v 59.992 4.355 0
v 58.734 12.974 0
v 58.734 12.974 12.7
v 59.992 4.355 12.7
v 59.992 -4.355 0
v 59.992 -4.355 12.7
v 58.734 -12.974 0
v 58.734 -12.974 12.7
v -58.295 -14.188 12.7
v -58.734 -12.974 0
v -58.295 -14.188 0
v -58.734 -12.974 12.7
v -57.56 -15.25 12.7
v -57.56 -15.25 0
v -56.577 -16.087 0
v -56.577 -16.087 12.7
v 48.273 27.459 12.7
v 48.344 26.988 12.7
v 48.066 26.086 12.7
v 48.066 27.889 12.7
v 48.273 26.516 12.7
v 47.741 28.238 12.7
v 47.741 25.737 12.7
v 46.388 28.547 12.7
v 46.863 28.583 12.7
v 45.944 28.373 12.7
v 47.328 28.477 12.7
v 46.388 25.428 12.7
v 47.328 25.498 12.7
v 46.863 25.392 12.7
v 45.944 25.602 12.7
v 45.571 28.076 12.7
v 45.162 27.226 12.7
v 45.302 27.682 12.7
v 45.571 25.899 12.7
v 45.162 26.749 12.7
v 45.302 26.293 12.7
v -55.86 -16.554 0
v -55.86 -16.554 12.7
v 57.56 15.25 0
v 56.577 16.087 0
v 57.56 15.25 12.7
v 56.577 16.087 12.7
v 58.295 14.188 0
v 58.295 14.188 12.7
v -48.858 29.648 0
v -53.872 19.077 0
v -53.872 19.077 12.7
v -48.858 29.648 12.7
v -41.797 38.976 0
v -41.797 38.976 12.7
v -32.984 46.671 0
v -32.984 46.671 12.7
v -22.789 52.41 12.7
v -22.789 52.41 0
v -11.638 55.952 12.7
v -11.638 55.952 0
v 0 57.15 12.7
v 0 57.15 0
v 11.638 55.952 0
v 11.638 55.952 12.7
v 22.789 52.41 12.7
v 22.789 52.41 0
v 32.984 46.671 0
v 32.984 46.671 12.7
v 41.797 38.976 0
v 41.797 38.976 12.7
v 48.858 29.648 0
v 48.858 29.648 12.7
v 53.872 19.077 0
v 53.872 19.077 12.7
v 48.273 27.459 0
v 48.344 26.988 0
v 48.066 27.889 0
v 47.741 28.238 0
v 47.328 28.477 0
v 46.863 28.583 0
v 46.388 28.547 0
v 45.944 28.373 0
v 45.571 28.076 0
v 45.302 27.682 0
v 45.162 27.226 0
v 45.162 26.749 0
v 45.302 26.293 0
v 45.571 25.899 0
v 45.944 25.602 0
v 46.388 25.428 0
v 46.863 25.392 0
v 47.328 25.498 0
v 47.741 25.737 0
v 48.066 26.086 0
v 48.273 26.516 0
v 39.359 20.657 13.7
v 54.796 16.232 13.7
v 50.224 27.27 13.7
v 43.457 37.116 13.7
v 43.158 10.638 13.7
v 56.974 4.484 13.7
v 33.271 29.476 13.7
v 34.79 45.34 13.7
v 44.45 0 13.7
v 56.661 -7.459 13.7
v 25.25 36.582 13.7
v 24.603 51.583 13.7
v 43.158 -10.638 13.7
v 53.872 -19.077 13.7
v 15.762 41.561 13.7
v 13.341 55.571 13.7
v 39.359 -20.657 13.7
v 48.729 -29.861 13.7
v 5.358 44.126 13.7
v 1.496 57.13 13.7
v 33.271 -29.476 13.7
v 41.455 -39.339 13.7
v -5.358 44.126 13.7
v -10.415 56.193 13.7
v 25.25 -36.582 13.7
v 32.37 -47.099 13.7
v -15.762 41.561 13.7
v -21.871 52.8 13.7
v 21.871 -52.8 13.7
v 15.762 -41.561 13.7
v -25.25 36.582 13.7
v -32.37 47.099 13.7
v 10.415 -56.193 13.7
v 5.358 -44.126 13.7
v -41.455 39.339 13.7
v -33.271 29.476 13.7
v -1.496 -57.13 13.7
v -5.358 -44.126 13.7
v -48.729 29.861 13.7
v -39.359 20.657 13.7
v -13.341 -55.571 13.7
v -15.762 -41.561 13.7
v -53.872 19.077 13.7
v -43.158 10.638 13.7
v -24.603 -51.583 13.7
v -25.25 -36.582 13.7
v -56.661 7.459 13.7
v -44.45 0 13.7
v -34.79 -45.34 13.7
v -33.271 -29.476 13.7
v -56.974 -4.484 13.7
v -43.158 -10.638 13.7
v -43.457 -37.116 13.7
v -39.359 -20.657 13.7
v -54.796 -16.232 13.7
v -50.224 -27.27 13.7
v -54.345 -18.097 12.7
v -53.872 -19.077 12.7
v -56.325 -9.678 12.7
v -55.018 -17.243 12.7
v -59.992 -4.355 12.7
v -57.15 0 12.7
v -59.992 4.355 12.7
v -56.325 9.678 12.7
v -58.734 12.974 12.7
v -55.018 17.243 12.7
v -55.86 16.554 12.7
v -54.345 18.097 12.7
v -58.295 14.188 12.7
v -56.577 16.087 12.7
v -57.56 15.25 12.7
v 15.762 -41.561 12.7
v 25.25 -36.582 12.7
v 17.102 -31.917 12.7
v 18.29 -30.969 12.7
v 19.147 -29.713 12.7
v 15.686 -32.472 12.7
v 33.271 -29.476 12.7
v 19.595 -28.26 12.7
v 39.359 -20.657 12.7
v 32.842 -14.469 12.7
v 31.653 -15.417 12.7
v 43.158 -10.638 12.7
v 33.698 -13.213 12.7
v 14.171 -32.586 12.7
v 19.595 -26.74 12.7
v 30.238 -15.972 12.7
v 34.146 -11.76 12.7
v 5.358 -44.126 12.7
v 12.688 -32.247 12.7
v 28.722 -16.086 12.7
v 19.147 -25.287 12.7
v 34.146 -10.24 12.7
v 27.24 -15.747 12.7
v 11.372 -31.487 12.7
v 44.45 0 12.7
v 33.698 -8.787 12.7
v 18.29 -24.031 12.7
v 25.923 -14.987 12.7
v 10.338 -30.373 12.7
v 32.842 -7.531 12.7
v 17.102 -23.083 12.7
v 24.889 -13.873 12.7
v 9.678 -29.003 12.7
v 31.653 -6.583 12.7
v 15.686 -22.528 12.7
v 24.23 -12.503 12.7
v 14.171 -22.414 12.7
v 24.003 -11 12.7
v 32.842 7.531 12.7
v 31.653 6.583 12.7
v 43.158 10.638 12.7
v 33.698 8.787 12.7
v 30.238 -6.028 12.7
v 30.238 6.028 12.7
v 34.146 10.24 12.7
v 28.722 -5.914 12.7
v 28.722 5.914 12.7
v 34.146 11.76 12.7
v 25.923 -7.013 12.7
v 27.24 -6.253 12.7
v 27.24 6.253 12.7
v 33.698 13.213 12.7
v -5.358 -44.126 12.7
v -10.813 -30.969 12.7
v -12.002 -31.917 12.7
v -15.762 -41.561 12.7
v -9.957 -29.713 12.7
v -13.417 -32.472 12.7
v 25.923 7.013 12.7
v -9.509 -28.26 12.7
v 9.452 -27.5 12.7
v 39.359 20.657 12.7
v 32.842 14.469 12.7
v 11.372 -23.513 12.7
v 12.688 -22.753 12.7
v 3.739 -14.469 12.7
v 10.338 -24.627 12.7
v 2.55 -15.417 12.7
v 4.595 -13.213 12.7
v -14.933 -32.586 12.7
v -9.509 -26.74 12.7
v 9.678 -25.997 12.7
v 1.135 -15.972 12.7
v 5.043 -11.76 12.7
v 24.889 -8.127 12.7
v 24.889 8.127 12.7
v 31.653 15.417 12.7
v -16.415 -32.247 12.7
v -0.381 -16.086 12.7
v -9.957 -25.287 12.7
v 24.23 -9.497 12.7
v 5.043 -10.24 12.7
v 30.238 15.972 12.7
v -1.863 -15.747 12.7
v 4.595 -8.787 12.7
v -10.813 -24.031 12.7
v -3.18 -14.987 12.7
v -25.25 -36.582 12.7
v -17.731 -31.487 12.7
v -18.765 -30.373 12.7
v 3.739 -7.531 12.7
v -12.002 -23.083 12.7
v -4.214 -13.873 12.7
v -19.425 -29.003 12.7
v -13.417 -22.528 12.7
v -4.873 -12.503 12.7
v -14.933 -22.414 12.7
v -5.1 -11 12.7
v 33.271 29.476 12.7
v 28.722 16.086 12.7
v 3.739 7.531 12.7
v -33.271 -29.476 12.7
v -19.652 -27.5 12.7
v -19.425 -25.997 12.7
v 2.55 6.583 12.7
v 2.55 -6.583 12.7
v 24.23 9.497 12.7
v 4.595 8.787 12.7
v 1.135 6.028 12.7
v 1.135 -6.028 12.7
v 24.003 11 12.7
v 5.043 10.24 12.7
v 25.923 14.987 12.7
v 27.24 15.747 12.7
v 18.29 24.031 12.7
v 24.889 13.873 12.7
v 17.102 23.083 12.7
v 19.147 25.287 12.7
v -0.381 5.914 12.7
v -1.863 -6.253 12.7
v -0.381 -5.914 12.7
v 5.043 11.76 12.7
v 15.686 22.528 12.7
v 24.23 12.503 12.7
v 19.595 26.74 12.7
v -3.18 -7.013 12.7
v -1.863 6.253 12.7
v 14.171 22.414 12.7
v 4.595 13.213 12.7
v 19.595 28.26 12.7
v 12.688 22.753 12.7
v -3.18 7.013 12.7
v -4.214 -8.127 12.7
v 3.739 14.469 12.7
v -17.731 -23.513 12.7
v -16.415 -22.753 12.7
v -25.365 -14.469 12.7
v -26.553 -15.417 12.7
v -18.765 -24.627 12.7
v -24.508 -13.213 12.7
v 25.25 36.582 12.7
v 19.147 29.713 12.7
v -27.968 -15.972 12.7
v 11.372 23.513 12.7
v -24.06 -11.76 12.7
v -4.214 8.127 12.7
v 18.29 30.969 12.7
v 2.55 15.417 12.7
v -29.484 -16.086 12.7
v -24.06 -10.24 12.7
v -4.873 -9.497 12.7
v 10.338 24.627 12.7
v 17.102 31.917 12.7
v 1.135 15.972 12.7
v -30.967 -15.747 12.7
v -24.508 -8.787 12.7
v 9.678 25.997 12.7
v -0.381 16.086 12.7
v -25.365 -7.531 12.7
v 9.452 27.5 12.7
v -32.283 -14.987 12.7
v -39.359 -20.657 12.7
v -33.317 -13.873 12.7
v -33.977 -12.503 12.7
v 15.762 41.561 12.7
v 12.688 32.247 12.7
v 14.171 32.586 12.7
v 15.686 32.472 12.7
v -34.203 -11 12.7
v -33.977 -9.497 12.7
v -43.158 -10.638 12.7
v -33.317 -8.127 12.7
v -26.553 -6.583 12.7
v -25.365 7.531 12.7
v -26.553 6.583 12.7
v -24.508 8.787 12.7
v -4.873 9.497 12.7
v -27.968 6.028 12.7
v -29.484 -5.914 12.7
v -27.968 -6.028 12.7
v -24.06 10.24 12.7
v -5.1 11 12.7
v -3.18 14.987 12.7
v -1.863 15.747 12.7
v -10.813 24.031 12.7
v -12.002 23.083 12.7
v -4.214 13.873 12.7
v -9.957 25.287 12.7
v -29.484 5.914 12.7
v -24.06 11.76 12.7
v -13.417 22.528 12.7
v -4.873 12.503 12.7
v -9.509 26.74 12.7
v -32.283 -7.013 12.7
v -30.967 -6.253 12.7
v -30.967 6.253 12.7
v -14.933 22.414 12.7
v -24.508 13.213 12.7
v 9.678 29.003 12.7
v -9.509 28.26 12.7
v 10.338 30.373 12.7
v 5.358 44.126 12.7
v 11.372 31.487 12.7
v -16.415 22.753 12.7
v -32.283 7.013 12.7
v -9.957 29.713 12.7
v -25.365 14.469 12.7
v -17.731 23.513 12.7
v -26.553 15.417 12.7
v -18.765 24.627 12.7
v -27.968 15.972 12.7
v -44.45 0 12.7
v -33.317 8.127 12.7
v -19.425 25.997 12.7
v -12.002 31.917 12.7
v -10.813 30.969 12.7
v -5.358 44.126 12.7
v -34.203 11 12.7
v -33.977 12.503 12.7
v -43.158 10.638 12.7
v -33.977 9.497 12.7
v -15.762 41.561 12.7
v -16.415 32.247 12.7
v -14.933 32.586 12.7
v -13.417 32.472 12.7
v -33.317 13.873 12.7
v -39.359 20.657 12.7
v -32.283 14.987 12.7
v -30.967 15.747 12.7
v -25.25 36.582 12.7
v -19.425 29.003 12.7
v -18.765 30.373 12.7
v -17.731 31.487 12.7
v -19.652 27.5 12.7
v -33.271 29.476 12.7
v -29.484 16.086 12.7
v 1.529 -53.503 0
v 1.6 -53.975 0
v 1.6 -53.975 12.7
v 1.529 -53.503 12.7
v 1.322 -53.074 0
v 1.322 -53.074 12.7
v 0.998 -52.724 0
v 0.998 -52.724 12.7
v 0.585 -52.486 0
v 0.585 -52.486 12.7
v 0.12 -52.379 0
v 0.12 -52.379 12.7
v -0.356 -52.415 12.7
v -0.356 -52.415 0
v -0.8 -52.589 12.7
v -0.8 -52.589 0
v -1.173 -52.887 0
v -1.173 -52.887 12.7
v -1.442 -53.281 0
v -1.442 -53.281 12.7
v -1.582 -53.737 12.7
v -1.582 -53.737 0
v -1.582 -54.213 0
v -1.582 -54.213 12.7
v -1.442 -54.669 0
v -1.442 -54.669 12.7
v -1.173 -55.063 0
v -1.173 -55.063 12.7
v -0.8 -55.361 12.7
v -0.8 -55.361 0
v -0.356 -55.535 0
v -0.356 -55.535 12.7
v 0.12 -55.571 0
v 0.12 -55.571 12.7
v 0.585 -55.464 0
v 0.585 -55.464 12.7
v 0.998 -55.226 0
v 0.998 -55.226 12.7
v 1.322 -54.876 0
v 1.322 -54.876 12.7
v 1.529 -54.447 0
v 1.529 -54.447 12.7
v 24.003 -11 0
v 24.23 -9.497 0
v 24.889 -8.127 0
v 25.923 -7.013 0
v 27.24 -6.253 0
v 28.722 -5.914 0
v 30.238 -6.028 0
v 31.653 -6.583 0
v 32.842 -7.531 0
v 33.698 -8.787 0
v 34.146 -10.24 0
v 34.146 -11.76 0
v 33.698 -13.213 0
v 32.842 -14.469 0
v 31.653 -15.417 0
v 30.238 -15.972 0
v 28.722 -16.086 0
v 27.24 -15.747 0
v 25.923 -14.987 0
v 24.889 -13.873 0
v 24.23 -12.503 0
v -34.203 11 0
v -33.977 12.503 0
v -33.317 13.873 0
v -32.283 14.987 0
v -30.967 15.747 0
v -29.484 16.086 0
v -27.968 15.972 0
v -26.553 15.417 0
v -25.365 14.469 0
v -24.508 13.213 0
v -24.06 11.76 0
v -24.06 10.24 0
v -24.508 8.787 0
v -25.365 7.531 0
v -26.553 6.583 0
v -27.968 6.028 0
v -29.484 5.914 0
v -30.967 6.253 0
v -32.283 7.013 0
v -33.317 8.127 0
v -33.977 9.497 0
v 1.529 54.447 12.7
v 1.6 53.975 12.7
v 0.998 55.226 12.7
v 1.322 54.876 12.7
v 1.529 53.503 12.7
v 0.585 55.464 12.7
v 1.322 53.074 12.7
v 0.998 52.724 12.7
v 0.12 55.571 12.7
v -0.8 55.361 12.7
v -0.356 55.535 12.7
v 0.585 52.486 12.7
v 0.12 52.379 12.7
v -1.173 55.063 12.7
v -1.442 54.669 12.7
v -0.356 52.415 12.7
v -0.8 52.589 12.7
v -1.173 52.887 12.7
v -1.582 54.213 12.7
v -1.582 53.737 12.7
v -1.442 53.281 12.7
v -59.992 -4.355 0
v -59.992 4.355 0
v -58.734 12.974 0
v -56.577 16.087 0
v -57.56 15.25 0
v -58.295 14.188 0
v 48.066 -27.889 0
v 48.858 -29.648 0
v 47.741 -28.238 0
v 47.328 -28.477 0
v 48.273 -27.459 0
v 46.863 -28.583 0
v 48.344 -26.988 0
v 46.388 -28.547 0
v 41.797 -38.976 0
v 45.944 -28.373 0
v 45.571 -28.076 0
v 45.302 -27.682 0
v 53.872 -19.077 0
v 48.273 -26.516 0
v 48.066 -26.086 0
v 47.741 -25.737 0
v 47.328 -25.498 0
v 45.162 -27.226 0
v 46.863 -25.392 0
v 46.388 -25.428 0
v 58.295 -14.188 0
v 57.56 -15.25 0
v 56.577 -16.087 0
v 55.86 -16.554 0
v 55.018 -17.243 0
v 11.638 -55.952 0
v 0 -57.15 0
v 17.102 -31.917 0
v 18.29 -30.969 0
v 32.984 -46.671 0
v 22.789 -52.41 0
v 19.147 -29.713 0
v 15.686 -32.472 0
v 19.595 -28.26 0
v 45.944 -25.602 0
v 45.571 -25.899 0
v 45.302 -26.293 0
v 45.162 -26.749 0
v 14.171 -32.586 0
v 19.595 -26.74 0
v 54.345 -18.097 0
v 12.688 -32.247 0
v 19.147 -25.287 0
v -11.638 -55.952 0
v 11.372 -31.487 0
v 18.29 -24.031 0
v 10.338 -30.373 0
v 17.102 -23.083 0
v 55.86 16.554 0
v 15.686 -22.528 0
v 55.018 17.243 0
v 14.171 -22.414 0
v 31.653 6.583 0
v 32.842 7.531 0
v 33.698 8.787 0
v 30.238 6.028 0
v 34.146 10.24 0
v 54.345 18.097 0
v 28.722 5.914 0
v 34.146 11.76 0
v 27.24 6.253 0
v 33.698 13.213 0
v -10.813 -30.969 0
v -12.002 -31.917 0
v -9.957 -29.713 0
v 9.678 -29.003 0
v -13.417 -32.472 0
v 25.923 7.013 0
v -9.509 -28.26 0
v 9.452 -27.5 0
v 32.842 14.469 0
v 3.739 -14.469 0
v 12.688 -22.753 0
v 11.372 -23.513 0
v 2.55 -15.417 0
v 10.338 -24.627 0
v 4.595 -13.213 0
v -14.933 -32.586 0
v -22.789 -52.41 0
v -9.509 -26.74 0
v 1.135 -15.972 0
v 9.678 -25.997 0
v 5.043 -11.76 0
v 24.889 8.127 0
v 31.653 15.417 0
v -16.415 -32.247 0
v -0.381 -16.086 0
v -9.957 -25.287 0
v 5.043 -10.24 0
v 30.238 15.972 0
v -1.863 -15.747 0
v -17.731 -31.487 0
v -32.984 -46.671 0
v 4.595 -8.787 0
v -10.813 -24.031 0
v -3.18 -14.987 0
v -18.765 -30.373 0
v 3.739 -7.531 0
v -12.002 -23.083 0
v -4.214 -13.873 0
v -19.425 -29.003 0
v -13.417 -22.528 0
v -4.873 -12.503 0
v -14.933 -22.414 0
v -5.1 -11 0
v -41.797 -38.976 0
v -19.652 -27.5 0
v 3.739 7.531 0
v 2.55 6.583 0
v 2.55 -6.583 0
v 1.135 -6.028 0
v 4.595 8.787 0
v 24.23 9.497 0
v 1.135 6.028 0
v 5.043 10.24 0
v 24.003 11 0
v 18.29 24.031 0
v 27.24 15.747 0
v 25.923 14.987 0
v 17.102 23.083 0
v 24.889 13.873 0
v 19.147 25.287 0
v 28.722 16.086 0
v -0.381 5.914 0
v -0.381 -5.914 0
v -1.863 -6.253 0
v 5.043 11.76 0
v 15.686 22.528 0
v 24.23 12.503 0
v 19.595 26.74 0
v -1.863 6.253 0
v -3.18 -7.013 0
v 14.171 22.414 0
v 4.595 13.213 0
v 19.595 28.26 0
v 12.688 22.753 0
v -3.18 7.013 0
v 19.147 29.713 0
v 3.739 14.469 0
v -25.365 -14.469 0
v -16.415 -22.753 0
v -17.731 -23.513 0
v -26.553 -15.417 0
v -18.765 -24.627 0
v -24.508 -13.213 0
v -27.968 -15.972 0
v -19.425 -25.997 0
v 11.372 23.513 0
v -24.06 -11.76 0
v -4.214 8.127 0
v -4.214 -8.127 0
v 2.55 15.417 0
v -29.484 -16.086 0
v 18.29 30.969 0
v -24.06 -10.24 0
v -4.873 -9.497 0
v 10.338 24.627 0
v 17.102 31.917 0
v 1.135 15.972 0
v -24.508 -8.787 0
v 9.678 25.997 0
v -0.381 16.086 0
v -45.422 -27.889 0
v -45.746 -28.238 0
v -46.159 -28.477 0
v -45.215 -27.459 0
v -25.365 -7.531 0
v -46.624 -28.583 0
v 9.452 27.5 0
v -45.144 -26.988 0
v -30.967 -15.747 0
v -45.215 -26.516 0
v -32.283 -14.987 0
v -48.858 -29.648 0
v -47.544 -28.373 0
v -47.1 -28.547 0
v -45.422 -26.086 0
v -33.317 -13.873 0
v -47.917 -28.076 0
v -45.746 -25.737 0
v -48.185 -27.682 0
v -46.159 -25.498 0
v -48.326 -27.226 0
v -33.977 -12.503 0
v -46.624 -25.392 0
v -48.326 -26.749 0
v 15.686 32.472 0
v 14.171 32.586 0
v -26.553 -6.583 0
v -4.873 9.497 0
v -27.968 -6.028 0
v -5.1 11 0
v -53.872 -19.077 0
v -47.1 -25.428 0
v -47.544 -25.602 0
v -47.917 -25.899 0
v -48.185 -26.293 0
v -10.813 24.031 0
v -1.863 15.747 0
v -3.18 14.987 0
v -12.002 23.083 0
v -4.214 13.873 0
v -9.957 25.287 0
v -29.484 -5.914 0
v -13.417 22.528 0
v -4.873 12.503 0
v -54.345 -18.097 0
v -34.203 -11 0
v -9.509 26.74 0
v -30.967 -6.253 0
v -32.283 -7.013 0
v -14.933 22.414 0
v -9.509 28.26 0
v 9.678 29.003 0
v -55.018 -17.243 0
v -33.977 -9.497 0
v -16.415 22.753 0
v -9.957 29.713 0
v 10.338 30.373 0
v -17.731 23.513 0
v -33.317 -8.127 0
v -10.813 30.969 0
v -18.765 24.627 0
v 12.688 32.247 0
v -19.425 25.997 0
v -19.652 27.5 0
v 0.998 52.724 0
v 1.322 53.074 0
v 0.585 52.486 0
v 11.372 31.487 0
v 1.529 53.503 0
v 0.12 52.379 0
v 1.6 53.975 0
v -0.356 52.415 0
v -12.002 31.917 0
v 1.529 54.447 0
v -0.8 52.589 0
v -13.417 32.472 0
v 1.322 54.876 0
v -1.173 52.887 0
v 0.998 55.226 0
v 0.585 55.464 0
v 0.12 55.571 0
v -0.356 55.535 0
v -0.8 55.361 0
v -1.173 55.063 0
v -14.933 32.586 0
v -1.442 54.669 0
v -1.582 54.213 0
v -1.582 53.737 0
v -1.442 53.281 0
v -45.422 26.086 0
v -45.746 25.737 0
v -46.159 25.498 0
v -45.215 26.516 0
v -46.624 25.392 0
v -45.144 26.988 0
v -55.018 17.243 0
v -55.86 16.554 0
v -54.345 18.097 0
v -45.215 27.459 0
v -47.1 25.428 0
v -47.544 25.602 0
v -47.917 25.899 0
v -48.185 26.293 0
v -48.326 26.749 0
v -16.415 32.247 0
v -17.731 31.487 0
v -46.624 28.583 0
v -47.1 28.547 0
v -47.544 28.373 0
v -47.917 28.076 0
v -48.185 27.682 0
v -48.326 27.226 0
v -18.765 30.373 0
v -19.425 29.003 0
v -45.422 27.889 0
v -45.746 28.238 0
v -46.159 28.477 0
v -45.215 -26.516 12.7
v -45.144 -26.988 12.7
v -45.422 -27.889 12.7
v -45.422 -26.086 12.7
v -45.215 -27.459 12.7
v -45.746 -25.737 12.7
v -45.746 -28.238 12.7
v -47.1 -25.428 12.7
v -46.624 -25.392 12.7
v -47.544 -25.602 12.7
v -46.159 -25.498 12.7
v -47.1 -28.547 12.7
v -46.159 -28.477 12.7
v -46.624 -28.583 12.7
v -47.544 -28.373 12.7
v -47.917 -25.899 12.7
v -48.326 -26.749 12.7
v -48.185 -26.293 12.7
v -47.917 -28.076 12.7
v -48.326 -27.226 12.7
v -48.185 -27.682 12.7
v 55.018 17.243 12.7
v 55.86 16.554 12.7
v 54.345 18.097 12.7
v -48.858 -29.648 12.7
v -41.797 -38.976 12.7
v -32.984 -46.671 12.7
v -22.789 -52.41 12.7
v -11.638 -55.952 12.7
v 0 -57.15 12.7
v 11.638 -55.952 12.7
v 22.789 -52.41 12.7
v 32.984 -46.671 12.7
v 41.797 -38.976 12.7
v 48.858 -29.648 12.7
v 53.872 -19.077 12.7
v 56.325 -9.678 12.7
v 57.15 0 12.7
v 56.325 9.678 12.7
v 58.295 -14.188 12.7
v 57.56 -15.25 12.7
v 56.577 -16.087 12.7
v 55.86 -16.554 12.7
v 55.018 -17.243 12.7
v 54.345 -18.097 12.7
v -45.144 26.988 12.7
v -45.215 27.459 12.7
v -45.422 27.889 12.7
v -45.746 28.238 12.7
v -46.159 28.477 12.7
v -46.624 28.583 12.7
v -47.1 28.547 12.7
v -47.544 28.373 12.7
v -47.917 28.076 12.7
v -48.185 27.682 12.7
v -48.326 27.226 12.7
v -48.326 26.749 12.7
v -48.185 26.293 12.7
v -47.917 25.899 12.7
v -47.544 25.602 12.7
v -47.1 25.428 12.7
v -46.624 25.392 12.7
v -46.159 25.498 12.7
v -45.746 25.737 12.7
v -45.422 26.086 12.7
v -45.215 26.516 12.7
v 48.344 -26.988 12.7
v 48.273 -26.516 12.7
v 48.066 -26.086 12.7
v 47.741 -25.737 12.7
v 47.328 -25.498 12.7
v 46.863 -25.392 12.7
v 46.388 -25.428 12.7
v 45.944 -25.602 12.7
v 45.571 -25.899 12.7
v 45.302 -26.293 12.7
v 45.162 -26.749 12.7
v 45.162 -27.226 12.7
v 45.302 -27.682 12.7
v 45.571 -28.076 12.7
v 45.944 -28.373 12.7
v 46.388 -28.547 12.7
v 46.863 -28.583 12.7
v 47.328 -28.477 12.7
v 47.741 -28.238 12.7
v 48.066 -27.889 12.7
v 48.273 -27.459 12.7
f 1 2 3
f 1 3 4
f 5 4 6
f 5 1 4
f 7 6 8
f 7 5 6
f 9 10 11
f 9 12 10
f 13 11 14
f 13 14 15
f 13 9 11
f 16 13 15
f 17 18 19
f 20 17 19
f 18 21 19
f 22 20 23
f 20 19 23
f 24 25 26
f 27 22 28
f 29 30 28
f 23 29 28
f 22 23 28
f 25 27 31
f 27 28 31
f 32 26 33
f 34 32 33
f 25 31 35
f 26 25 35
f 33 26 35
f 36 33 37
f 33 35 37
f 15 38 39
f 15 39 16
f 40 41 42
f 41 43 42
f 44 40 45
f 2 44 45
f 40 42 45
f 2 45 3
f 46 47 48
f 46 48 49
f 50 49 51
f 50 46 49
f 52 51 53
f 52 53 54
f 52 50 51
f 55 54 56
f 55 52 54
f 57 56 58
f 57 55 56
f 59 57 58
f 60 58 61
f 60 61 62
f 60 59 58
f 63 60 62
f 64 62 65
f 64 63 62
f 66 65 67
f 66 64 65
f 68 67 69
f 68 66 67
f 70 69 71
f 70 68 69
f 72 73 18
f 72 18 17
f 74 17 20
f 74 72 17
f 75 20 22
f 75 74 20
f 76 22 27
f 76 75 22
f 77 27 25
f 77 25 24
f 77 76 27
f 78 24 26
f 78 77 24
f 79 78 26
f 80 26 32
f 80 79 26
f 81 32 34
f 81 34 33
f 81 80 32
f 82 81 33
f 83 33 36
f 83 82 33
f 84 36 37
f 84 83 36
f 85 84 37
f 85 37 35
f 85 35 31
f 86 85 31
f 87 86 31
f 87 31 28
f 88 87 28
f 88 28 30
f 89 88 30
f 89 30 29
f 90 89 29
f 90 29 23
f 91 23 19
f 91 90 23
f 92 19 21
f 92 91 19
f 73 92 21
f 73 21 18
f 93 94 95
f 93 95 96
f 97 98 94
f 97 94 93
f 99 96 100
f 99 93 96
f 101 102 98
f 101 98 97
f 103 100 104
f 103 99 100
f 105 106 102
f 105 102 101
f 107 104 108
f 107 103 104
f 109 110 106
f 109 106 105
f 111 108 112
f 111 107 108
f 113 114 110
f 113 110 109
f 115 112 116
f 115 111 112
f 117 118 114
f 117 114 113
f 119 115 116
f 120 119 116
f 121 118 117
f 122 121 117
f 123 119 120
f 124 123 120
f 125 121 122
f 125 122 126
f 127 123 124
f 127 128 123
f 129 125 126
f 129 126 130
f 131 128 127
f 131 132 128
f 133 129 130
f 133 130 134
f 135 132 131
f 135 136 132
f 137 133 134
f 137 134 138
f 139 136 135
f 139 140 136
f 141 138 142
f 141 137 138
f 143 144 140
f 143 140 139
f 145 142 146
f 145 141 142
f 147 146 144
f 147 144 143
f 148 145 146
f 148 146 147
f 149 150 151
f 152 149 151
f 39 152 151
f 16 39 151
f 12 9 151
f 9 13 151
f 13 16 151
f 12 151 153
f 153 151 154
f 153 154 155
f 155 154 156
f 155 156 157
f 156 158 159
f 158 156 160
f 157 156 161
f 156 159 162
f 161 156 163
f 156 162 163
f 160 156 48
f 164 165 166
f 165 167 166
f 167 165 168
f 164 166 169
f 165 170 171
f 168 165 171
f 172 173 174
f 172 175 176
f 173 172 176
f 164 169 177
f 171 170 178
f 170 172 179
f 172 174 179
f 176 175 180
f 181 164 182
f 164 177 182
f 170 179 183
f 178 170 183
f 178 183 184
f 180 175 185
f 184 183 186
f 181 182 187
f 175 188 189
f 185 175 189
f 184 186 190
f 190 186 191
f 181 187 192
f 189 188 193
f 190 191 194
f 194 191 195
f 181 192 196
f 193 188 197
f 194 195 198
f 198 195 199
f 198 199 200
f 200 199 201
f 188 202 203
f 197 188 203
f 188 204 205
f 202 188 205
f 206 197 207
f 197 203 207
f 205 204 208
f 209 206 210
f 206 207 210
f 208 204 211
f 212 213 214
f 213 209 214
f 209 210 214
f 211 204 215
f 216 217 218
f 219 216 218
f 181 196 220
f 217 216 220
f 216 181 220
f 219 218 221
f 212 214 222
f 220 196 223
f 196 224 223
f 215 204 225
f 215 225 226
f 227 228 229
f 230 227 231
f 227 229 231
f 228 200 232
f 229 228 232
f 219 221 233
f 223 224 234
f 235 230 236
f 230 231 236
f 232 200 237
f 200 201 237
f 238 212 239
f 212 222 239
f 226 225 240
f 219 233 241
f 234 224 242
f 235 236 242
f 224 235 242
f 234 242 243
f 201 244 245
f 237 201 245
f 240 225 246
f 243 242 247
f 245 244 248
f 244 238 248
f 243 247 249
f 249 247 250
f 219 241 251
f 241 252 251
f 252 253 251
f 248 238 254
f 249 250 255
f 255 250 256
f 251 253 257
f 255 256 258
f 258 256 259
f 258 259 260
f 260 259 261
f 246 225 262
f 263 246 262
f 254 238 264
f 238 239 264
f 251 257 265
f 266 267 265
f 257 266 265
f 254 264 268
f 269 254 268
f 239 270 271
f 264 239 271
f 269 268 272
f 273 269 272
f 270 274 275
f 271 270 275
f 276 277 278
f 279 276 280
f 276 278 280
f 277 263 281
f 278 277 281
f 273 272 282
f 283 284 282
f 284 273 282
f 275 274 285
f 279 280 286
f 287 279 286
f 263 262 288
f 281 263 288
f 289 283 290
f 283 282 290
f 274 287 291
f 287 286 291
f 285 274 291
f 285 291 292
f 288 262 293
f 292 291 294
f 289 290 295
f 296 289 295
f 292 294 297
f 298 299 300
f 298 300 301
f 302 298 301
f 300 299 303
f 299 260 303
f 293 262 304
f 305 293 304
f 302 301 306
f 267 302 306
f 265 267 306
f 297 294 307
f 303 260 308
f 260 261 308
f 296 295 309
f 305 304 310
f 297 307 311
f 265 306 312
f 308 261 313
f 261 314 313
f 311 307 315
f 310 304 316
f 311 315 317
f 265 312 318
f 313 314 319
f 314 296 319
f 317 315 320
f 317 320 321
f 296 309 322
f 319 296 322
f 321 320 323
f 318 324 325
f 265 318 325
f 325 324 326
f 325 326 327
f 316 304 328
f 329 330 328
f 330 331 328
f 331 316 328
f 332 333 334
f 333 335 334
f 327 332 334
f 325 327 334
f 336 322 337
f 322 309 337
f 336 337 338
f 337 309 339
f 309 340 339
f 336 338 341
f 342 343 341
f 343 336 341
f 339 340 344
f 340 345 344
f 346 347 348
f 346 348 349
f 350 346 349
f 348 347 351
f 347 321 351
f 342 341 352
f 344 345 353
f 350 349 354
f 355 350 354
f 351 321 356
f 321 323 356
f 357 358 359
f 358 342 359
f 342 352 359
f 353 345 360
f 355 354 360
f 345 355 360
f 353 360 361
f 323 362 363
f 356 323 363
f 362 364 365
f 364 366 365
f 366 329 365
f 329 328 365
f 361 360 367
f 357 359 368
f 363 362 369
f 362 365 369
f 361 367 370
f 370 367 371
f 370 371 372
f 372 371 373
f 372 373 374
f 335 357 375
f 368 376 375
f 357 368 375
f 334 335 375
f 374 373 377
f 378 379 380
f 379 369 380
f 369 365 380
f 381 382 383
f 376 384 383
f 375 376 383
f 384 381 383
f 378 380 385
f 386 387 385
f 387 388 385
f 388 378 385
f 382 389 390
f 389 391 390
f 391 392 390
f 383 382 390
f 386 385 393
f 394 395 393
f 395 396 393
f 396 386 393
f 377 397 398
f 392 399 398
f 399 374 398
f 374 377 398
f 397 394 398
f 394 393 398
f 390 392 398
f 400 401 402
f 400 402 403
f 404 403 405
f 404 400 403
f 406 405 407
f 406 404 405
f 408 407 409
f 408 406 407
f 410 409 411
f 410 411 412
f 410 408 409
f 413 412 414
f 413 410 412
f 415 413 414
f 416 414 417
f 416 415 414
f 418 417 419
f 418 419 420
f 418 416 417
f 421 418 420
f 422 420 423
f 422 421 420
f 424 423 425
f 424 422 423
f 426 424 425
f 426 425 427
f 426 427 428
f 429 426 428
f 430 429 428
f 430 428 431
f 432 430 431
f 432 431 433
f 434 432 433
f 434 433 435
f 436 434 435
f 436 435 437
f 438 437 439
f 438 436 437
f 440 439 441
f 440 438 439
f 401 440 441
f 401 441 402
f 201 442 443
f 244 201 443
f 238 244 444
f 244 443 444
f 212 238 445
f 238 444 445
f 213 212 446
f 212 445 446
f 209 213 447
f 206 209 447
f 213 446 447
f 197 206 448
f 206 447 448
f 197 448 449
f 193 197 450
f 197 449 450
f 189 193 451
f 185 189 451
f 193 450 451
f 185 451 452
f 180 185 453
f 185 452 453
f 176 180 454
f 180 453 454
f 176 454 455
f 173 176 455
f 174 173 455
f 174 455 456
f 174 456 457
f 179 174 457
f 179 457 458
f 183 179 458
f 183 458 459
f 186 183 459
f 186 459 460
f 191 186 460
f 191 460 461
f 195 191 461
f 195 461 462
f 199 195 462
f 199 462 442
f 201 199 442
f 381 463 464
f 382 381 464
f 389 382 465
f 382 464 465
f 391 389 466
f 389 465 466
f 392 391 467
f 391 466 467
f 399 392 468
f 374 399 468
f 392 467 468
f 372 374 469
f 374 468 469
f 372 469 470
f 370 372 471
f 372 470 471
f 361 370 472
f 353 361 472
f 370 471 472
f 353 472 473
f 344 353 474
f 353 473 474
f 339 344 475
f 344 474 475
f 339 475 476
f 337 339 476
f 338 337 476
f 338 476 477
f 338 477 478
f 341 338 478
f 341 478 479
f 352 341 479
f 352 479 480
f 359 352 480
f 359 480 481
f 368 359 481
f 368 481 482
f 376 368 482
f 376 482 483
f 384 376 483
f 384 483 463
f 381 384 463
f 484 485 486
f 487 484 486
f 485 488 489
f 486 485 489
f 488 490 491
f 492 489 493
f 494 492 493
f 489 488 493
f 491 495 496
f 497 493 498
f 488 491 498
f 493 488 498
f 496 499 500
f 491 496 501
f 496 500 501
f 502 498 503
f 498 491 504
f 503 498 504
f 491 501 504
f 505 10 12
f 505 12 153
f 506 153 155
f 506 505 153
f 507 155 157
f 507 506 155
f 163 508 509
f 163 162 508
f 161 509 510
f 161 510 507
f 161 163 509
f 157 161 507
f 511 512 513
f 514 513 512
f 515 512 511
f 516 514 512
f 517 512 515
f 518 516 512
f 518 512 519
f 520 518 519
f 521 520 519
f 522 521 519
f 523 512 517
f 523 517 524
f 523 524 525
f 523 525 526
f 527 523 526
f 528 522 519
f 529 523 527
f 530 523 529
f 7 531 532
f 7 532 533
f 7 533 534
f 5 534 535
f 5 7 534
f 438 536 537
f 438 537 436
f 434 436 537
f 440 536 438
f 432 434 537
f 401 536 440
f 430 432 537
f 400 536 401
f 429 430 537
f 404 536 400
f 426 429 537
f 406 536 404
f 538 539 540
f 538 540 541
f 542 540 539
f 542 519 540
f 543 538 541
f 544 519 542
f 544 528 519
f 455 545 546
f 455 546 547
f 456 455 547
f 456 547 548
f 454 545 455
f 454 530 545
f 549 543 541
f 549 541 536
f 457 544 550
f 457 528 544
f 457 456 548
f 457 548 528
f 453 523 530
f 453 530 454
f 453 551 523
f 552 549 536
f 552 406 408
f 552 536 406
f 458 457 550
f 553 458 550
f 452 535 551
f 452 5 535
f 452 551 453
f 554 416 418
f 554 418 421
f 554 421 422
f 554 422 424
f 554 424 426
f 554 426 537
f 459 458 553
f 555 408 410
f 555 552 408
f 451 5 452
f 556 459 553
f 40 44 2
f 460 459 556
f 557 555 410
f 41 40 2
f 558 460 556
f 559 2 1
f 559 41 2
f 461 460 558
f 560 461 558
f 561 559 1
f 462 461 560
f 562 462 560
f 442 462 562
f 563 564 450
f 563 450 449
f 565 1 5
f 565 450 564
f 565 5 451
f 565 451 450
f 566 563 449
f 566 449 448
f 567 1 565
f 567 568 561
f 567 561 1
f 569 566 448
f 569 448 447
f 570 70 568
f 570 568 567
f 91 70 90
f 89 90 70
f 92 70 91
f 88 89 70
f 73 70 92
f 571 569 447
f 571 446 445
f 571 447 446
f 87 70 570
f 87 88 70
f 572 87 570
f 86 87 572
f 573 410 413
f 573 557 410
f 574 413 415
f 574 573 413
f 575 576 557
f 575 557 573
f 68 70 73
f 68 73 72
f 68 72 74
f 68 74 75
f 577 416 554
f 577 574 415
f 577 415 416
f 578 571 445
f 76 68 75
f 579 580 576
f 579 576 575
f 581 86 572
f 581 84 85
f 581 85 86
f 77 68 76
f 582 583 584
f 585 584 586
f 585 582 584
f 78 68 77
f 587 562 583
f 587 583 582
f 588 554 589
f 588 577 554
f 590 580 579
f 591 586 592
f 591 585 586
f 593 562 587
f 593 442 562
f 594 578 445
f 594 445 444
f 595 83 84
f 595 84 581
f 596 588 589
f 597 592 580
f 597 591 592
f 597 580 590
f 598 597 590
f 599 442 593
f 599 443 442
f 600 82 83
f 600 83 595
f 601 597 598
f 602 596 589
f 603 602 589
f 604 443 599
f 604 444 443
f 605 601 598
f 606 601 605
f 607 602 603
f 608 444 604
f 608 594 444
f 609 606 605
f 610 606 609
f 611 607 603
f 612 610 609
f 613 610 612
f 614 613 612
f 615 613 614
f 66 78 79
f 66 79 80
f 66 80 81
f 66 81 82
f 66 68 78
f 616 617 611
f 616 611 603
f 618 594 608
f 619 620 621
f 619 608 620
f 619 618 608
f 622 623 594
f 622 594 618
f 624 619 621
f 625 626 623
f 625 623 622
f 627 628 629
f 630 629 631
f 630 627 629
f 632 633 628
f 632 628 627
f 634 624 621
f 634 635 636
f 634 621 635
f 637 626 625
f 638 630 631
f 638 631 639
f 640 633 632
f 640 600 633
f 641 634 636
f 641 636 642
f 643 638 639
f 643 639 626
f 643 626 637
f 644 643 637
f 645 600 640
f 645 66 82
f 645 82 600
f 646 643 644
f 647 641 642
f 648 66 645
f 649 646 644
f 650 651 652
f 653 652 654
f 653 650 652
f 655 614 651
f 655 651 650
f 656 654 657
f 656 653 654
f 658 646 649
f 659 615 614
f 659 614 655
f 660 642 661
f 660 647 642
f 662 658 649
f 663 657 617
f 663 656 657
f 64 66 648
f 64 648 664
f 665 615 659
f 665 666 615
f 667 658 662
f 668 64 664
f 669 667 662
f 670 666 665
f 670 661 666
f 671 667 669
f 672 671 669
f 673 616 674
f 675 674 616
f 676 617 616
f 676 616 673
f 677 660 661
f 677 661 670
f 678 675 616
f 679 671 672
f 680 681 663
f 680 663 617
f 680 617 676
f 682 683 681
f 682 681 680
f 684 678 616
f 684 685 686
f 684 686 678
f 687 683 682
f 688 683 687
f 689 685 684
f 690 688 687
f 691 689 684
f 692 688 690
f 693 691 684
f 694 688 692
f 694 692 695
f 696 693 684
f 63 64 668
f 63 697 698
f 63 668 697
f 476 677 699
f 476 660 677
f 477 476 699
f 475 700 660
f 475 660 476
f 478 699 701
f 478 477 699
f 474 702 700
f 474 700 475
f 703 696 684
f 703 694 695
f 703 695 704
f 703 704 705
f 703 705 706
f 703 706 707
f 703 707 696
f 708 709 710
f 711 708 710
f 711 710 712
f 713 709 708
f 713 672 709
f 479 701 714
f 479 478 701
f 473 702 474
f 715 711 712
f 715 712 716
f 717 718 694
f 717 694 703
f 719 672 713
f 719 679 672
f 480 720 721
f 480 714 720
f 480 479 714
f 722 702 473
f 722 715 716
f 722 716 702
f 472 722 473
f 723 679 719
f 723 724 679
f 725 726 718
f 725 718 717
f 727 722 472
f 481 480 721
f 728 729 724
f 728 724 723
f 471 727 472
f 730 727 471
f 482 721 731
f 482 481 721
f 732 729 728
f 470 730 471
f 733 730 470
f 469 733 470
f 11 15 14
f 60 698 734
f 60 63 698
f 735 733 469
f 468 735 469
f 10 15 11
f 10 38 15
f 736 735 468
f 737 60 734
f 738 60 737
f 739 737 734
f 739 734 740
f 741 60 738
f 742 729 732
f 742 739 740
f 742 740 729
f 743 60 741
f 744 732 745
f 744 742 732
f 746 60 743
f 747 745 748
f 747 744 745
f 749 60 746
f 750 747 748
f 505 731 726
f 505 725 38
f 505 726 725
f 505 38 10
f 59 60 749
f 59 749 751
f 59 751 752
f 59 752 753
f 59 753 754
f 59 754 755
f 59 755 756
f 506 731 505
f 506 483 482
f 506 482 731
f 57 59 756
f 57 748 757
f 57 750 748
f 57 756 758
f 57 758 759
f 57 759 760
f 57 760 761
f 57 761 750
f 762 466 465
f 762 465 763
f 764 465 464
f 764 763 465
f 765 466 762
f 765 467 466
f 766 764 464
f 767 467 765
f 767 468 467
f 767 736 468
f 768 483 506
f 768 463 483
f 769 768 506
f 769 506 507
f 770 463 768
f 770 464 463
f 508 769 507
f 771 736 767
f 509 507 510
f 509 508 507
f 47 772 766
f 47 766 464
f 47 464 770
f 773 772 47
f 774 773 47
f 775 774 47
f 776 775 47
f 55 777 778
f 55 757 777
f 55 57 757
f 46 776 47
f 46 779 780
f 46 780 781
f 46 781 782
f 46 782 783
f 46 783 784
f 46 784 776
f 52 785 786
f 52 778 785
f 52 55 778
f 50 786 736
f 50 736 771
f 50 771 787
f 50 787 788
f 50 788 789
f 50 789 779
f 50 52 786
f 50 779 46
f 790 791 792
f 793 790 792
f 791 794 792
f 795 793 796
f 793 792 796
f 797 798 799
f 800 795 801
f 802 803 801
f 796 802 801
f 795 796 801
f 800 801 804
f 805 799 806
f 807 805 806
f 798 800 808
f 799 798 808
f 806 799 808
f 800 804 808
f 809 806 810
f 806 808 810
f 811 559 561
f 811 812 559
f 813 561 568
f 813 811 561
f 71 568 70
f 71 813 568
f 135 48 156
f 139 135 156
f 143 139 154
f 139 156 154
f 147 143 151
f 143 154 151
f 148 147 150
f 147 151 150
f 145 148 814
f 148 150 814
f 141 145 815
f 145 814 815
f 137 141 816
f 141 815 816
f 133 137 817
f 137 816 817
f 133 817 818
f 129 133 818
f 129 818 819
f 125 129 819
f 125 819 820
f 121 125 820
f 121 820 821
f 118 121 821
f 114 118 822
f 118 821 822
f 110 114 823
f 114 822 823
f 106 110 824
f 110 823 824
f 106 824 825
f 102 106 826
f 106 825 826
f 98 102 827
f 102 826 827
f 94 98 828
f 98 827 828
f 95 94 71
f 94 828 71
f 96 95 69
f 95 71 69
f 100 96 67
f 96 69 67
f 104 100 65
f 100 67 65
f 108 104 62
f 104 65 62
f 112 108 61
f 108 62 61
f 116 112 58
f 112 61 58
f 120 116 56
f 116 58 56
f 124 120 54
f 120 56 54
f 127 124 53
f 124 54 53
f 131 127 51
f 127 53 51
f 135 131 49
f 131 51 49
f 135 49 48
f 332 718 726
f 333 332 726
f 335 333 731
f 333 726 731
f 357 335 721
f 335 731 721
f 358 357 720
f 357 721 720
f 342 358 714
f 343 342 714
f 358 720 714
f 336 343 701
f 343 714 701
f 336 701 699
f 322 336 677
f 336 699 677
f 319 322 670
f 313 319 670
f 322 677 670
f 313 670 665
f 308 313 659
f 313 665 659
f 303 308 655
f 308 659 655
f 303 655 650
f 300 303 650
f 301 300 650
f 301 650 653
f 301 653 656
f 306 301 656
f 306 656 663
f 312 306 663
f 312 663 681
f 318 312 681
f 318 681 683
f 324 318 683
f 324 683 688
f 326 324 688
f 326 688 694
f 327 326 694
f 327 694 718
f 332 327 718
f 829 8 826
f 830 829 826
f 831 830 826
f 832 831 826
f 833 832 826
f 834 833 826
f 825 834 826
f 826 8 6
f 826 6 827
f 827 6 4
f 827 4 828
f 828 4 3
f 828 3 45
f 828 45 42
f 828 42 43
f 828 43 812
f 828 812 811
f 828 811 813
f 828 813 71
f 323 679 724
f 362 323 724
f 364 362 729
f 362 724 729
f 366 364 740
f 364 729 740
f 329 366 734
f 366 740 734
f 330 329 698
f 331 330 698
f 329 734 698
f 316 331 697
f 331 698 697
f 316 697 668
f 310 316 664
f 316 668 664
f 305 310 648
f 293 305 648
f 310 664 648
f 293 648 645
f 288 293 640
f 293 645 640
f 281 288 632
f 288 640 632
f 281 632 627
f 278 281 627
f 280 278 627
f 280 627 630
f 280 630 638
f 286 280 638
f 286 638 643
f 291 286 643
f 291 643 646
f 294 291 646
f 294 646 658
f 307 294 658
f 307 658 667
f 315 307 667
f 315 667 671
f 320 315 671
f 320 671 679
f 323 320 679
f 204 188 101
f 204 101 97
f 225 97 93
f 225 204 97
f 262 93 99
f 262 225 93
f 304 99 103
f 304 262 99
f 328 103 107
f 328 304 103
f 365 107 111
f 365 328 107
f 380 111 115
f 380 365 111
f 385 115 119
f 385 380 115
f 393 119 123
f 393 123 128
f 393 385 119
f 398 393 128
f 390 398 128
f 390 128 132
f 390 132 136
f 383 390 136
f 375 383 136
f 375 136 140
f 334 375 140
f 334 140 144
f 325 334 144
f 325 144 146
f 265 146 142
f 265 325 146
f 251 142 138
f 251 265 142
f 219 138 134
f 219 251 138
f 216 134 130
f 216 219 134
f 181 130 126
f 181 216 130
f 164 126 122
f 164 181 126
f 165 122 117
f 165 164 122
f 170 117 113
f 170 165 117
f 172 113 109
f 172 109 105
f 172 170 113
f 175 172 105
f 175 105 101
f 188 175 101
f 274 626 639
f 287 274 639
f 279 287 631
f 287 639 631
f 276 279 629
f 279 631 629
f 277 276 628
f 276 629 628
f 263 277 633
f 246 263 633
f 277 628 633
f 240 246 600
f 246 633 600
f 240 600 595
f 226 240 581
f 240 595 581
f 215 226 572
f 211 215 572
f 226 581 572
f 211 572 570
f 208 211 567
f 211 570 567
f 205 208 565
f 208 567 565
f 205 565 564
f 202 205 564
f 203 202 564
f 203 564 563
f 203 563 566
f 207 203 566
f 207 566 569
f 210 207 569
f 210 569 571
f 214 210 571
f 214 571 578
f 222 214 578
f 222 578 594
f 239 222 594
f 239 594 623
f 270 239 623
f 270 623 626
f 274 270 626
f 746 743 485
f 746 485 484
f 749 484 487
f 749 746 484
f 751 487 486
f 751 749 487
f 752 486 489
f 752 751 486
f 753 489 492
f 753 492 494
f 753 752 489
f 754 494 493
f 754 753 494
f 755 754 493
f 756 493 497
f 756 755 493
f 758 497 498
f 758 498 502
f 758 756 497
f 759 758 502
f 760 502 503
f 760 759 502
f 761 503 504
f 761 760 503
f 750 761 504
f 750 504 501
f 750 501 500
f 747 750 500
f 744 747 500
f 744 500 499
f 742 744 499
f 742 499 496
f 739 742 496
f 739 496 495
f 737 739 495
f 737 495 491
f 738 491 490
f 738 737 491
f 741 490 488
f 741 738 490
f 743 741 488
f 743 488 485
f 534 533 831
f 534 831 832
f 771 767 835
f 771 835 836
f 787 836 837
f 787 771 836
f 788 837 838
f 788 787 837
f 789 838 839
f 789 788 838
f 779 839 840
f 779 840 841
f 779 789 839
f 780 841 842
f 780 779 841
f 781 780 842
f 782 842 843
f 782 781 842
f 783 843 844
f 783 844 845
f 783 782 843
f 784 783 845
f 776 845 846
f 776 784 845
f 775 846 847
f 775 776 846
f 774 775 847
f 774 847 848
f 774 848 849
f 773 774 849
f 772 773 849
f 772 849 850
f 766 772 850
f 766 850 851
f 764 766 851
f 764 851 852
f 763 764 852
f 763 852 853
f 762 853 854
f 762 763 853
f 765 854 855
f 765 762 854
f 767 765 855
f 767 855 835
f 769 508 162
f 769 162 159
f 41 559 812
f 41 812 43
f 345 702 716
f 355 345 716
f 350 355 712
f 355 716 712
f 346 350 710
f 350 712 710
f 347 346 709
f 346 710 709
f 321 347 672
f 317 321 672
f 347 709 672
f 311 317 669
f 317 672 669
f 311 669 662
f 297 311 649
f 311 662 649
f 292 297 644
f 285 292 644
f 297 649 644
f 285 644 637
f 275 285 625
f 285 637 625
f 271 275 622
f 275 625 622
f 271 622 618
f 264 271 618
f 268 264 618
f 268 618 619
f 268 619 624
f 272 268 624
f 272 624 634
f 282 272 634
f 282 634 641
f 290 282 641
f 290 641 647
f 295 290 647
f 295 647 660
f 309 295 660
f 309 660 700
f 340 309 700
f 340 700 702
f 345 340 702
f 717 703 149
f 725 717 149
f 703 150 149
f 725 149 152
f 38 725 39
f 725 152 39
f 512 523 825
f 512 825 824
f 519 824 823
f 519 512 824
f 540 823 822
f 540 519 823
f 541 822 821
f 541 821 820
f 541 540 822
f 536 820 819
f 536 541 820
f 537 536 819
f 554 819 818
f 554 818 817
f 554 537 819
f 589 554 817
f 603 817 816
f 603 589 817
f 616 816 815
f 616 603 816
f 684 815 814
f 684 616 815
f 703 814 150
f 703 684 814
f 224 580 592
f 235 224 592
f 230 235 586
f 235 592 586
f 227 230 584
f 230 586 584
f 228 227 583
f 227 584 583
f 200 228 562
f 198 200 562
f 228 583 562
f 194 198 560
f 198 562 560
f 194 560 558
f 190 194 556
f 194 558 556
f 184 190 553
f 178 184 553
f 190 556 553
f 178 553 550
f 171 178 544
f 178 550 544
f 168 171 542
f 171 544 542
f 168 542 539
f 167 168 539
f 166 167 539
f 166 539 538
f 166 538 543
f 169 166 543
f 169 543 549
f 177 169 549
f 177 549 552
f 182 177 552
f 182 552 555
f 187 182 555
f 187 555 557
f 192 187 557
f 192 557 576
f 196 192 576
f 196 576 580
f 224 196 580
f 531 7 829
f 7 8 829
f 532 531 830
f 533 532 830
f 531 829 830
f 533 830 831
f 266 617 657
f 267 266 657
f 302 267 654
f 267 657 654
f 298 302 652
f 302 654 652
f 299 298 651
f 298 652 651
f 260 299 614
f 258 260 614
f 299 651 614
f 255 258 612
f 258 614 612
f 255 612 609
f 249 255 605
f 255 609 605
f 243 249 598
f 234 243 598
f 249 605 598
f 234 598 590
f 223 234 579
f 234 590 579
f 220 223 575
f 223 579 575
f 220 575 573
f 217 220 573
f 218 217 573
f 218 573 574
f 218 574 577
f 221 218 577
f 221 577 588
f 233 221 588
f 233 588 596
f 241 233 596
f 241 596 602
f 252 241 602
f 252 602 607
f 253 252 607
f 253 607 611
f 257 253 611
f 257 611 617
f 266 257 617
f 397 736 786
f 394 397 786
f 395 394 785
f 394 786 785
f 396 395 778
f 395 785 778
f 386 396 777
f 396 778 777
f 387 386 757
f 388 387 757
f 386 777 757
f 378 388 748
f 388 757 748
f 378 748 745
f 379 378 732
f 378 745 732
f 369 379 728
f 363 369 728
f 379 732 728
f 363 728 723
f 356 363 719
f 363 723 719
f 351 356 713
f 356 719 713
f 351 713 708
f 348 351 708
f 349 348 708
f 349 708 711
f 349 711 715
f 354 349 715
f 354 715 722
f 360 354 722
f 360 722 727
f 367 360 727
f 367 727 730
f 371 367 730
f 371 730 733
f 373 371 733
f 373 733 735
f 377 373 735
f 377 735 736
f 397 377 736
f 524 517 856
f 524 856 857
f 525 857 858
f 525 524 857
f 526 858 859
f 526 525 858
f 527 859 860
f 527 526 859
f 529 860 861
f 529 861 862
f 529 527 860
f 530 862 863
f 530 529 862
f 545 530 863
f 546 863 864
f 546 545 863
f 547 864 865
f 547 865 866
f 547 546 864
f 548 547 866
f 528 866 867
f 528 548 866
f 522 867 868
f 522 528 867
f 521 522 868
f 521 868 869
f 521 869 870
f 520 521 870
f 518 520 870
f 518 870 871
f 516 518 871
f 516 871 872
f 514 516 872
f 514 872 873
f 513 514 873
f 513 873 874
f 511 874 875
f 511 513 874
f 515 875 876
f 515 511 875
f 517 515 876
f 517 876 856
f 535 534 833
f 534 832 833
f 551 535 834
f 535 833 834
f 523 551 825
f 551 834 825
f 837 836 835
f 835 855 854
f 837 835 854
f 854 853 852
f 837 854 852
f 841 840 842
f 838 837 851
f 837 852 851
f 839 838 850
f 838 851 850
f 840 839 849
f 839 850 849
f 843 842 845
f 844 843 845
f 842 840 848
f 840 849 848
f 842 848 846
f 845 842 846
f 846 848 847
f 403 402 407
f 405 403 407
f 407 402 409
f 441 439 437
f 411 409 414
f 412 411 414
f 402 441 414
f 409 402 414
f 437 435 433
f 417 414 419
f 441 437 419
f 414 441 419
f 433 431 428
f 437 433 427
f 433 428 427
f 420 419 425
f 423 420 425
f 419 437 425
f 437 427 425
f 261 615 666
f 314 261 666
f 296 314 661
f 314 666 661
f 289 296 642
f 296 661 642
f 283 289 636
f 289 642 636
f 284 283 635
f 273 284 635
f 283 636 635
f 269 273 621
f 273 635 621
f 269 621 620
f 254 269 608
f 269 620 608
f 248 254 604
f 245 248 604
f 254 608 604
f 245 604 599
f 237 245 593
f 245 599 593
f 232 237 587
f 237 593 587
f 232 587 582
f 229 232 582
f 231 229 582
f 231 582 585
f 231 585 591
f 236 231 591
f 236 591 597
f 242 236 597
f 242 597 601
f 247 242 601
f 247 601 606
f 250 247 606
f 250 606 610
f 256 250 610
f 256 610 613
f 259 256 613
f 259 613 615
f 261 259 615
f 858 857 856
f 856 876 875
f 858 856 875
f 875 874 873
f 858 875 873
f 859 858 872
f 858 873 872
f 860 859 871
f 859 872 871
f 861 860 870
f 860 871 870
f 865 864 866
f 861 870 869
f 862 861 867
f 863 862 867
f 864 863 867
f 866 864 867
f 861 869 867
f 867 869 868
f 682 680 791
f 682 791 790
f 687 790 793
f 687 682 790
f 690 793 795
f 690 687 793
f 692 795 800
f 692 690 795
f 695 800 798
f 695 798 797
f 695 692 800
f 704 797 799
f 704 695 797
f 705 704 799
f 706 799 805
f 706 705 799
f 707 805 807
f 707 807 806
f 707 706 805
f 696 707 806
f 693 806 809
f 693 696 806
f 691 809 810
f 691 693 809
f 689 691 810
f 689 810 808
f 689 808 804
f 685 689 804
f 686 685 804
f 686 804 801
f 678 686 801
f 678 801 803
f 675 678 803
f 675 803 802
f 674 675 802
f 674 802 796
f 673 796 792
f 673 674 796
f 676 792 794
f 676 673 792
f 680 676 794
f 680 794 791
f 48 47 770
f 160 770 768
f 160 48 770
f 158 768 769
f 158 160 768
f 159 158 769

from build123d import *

# Parameters (mm, degrees)
SKETCH1_R              = 1.6
BOSS_EXTRUDE1_DEPTH    = 12.7
SKETCH6_R              = 5.1
CUT_EXTRUDE2_DEPTH     = 84.93709
FILLET1_R              = 5
SKETCH7_R              = 57.15
SKETCH7_R_2            = 44.45
ANALYSIS_SUPPORT_DEPTH = 1


with BuildPart() as part:
    # Sketch1 → Boss-Extrude1 (new body)
    with BuildSketch(Plane.XY):
        with BuildLine():
            Line((54.40471, 17.5), (58.249657, 15))
            ThreePointArc((58.249657, 15), (60.15, 0), (58.249657, -15))
            Line((58.249657, -15), (54.40471, -17.5))
            ThreePointArc((54.40471, -17.5), (0, -57.15), (-54.40471, -17.5))
            Line((-54.40471, -17.5), (-58.249657, -15))
            ThreePointArc((-58.249657, -15), (-60.15, 0), (-58.249657, 15))
            Line((-58.249657, 15), (-54.40471, 17.5))
            ThreePointArc((-54.40471, 17.5), (0, 57.15), (54.40471, 17.5))
        make_face()
        with Locations((0, 53.975)):
            Circle(SKETCH1_R, mode=Mode.SUBTRACT)
        with Locations((46.743721, 26.9875)):
            Circle(SKETCH1_R, mode=Mode.SUBTRACT)
        with Locations((46.743721, -26.9875)):
            Circle(SKETCH1_R, mode=Mode.SUBTRACT)
        with Locations((0, -53.975)):
            Circle(SKETCH1_R, mode=Mode.SUBTRACT)
        with Locations((-46.743721, -26.9875)):
            Circle(SKETCH1_R, mode=Mode.SUBTRACT)
        with Locations((-46.743721, 26.9875)):
            Circle(SKETCH1_R, mode=Mode.SUBTRACT)
    extrude(amount=BOSS_EXTRUDE1_DEPTH)

    # Sketch6 → Cut-Extrude2 (cut, through all)
    with BuildSketch(Plane(origin=(0, 0, 0), x_dir=(-1, 0, 0), z_dir=(0, 0, -1))):
        with Locations((14.551632, 27.5)):
            Circle(SKETCH6_R)
        with Locations((-29.103264, 11)):
            Circle(SKETCH6_R)
        with Locations((-29.103264, -11)):
            Circle(SKETCH6_R)
        with Locations((29.103264, -11)):
            Circle(SKETCH6_R)
        with Locations((29.103264, 11)):
            Circle(SKETCH6_R)
        with Locations((-14.551632, 27.5)):
            Circle(SKETCH6_R)
        with Locations((0, -11)):
            Circle(SKETCH6_R)
        with Locations((-14.551632, -27.5)):
            Circle(SKETCH6_R)
        with Locations((0, 11)):
            Circle(SKETCH6_R)
        with Locations((14.551632, -27.5)):
            Circle(SKETCH6_R)
    extrude(amount=-CUT_EXTRUDE2_DEPTH, mode=Mode.SUBTRACT)

    # Fillet1
    fillet1_edges = [part.edges().sort_by_distance(p)[0] for p in [
        (54.40471, 17.5, 6.35),
        (58.249657, 15, 6.35),
        (58.249657, -15, 6.35),
        (54.40471, -17.5, 6.35),
        (-54.40471, -17.5, 6.35),
        (-58.249657, -15, 6.35),
        (-58.249657, 15, 6.35),
        (-54.40471, 17.5, 6.35),
    ]]
    fillet(fillet1_edges, radius=FILLET1_R)

    # Sketch7 → ANALYSIS-SUPPORT (add)
    with BuildSketch(Plane.XY.offset(12.7)):
        with Locations(Location((0, 0, 0), (0, 0, 160.500332))):
            Circle(SKETCH7_R)
        Circle(SKETCH7_R_2, mode=Mode.SUBTRACT)
    extrude(amount=ANALYSIS_SUPPORT_DEPTH)


solid = part.part
